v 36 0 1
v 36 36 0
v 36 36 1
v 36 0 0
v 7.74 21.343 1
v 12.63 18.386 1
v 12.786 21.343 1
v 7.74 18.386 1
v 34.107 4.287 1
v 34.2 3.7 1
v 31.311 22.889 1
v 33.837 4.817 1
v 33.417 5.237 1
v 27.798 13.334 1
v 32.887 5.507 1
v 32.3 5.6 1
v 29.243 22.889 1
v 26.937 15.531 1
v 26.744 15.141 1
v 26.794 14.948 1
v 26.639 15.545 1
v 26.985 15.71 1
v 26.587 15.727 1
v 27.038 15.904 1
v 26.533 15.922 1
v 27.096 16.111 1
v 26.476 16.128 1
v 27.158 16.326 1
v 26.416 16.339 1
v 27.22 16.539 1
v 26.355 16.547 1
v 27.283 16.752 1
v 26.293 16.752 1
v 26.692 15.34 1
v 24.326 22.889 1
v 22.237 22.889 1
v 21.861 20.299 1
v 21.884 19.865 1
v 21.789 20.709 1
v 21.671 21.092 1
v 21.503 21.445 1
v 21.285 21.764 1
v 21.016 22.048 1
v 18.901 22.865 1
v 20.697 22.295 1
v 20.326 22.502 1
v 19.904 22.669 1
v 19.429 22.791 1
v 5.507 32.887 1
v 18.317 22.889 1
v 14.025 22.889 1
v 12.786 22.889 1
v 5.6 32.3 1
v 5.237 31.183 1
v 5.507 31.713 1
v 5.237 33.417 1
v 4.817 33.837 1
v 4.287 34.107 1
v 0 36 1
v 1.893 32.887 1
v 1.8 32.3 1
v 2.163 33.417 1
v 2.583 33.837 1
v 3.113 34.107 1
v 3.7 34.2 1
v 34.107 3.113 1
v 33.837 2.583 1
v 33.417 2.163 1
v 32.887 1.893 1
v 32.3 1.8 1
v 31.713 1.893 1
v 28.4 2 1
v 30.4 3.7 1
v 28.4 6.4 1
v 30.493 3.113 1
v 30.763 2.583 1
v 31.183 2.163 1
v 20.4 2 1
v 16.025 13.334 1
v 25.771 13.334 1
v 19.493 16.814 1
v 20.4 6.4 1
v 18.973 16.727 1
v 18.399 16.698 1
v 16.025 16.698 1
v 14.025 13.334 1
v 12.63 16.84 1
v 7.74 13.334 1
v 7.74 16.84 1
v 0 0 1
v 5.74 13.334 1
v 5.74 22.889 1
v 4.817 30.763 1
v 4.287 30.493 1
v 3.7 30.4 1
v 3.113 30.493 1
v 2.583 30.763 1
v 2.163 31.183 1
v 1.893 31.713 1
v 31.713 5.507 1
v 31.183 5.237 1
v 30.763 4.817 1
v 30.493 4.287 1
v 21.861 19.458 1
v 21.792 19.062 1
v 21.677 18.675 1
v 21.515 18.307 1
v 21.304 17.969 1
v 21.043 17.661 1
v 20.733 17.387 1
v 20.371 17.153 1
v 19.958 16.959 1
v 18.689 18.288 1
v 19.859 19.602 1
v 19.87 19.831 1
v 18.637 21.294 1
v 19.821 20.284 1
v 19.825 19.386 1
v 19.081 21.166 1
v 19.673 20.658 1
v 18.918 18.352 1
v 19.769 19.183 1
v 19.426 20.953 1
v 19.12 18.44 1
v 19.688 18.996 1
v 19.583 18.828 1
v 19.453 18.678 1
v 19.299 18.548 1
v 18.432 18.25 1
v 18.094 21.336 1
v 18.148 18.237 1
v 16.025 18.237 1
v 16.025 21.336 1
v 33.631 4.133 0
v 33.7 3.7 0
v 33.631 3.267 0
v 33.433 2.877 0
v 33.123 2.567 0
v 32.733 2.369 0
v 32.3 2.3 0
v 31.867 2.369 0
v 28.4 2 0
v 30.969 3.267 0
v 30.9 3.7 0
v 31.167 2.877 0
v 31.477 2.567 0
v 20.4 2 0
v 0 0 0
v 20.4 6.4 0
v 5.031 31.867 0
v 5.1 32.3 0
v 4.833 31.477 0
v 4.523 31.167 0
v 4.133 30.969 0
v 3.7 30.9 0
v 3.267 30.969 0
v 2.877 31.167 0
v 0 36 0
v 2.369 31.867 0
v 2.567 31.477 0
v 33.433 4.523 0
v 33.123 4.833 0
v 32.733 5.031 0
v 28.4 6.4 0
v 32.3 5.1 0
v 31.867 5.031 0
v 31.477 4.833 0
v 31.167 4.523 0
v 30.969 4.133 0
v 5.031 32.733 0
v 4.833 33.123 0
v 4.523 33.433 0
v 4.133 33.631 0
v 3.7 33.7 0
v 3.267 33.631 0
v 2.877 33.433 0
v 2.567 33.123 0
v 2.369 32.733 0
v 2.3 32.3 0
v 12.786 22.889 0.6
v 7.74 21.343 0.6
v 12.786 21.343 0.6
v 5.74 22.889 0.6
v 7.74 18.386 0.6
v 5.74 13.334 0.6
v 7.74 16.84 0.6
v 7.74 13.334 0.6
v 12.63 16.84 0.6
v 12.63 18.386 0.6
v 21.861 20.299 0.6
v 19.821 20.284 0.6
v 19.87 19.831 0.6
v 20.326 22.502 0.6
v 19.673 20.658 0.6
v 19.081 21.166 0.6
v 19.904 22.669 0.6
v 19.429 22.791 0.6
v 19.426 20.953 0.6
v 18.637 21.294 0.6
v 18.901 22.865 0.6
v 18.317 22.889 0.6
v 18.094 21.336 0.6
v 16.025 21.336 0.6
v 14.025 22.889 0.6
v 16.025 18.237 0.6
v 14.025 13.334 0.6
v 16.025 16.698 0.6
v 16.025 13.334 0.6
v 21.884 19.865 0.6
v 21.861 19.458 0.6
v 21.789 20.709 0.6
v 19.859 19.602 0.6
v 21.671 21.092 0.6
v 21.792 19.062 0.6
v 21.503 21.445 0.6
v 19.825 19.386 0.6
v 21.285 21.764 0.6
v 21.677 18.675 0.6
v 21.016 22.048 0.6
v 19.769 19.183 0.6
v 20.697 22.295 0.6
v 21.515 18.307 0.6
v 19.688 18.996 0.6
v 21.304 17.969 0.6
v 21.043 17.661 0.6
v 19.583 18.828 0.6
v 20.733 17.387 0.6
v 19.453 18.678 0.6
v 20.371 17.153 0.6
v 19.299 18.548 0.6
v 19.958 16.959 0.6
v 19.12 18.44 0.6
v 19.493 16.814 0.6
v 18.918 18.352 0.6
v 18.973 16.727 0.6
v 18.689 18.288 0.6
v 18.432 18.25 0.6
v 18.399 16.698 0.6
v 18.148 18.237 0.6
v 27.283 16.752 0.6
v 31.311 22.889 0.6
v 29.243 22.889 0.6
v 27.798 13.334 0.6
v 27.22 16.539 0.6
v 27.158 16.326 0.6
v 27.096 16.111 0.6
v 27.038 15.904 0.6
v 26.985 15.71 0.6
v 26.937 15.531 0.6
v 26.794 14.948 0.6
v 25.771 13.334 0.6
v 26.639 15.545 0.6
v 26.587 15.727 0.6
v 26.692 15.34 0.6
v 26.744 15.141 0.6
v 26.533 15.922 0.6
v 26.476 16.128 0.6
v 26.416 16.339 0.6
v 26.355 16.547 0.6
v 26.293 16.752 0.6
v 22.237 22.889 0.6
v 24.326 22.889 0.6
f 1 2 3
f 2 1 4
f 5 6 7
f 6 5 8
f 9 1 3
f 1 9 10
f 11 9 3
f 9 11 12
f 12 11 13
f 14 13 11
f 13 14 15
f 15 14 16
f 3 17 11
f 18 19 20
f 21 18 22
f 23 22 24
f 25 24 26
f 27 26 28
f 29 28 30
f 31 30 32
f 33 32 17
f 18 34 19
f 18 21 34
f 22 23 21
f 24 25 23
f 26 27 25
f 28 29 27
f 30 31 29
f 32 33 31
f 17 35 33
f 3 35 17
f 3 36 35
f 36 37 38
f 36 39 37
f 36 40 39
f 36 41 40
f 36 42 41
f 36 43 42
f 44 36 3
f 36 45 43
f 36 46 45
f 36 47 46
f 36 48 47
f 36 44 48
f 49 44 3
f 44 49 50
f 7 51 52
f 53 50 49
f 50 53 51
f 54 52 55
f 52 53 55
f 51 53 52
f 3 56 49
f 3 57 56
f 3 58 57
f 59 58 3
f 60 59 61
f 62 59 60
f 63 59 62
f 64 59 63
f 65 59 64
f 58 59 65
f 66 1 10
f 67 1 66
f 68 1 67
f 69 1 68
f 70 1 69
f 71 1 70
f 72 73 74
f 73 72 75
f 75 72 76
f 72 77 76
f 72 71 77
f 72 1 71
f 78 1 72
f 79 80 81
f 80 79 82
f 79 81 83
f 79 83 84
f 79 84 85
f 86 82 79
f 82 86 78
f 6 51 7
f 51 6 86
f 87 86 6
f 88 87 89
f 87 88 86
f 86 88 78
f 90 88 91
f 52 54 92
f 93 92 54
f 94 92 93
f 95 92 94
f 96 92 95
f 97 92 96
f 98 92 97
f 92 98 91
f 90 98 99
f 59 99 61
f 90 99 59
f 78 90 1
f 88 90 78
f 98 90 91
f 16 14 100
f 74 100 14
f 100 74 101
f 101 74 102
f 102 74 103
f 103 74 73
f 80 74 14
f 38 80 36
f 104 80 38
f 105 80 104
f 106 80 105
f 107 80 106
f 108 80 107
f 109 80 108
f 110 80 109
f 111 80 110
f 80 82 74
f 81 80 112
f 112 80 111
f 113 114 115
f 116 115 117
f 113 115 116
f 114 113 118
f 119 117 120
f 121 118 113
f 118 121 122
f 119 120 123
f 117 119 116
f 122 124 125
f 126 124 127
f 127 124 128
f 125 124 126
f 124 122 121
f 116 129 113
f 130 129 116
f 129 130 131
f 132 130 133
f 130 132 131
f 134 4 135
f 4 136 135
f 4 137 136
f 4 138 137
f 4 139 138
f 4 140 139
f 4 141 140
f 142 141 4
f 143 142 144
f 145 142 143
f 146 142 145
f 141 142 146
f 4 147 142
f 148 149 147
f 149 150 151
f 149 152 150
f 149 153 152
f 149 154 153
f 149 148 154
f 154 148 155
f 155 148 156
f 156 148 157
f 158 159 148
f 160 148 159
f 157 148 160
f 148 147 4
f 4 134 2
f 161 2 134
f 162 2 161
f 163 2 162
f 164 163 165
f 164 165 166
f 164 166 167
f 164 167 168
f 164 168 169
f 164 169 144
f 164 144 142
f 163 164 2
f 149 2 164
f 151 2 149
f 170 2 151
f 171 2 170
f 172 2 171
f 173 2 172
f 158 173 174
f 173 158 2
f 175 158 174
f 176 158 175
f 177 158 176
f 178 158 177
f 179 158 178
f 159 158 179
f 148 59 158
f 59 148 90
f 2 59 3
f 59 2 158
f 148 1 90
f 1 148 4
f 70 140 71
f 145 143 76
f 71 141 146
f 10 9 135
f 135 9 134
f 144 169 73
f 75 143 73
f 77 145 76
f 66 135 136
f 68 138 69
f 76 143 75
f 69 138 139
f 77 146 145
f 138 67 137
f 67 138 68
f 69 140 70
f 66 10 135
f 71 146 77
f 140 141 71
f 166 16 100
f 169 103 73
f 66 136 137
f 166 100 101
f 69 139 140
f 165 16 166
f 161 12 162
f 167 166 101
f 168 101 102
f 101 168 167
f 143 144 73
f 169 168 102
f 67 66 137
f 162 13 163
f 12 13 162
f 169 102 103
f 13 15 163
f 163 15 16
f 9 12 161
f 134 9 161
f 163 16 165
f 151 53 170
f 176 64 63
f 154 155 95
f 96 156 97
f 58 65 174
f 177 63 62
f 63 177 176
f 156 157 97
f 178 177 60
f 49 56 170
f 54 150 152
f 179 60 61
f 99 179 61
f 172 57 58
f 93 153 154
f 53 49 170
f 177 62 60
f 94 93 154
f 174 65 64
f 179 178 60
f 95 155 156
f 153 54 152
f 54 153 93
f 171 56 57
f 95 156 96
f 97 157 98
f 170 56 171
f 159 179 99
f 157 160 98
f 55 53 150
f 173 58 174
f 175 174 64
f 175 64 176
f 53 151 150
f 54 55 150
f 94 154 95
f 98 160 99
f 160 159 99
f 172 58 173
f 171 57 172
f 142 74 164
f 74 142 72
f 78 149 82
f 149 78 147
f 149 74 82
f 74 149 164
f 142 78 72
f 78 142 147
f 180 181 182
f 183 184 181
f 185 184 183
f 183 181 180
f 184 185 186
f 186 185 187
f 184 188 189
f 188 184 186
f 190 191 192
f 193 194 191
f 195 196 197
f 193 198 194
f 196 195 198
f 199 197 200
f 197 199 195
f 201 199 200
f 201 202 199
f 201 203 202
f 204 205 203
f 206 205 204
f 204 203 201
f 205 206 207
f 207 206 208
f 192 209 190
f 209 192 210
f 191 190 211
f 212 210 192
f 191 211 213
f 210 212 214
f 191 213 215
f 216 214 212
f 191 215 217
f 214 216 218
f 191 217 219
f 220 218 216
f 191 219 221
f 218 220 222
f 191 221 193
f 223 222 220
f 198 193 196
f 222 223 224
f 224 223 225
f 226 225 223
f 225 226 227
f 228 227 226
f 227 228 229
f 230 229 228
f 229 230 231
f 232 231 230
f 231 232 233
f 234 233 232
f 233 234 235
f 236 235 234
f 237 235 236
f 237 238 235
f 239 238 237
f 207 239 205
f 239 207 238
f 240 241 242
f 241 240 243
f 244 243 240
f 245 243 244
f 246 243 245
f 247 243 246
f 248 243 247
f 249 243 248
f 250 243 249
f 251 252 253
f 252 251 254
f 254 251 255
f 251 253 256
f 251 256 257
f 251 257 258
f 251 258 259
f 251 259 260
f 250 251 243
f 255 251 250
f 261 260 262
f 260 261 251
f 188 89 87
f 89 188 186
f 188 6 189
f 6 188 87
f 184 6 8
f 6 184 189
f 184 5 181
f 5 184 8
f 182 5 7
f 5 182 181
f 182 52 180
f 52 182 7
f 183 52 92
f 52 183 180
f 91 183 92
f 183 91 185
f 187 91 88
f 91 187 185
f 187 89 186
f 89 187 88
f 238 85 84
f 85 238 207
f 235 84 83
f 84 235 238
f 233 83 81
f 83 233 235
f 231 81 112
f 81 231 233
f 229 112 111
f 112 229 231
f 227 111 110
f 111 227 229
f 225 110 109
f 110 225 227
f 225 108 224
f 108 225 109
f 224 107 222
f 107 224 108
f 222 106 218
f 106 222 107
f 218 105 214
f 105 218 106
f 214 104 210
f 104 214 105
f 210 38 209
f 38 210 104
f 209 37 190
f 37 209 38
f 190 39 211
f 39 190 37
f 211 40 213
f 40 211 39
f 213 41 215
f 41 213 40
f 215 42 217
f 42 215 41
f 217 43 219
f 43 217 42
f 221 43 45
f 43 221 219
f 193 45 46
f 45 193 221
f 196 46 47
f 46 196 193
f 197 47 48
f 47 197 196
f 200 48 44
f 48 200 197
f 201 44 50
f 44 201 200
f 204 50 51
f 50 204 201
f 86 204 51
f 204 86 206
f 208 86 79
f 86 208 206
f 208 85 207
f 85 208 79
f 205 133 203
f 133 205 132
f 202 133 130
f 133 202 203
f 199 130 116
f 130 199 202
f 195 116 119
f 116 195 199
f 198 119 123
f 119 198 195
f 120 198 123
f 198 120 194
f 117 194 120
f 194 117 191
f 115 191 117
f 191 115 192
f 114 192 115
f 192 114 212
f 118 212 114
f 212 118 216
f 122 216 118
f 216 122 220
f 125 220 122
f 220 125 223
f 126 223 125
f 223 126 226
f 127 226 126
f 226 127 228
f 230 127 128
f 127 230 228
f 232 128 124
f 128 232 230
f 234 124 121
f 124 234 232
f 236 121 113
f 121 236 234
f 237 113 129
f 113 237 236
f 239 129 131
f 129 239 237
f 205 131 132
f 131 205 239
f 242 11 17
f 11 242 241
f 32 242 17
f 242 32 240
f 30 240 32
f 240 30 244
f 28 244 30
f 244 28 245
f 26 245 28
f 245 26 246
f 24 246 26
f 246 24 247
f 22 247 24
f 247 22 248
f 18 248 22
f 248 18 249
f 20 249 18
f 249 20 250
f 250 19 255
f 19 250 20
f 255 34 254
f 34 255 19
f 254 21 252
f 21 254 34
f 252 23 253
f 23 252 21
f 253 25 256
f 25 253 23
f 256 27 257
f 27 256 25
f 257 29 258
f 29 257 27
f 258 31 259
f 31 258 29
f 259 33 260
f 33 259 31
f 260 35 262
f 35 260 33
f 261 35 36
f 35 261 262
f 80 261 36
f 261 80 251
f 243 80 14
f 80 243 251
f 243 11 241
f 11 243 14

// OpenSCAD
/*
 * Created by:
 * Thomas Buck <xythobuz@xythobuz.de> in May 2016
 *
 * Licensed under the
 * Creative Commons - Attribution - Share Alike license.
 */

// -----------------------------------------------------------

width = 36;
height = 36;
depth = 1;

hole_bottom = 2.8;
hole_top = 3.8;
hole_dist = 3.7;

cut_height = 4.4;
cut_width = 8;
cut_dist_x = 20.4;
cut_dist_y = 2;

font = "Liberation Sans:style=Bold";
text_depth = 0.4;
string = "FPV";

$fn = 20;

// -----------------------------------------------------------

difference() {
    cube([width, height, depth]);
    
    translate([width - hole_dist, hole_dist, 0])
        cylinder(d1 = hole_bottom, d2 = hole_top, h = depth);
    
    translate([hole_dist, height - hole_dist, 0])
        cylinder(d1 = hole_bottom, d2 = hole_top, h = depth);
    
    translate([cut_dist_x, cut_dist_y, 0])
        cube([cut_width, cut_height, depth]);
    
    translate([width / 2, height / 2, depth - text_depth])
        linear_extrude(height = text_depth)
        text(string, font = font, size = 10, halign = "center", valign = "center");
}
